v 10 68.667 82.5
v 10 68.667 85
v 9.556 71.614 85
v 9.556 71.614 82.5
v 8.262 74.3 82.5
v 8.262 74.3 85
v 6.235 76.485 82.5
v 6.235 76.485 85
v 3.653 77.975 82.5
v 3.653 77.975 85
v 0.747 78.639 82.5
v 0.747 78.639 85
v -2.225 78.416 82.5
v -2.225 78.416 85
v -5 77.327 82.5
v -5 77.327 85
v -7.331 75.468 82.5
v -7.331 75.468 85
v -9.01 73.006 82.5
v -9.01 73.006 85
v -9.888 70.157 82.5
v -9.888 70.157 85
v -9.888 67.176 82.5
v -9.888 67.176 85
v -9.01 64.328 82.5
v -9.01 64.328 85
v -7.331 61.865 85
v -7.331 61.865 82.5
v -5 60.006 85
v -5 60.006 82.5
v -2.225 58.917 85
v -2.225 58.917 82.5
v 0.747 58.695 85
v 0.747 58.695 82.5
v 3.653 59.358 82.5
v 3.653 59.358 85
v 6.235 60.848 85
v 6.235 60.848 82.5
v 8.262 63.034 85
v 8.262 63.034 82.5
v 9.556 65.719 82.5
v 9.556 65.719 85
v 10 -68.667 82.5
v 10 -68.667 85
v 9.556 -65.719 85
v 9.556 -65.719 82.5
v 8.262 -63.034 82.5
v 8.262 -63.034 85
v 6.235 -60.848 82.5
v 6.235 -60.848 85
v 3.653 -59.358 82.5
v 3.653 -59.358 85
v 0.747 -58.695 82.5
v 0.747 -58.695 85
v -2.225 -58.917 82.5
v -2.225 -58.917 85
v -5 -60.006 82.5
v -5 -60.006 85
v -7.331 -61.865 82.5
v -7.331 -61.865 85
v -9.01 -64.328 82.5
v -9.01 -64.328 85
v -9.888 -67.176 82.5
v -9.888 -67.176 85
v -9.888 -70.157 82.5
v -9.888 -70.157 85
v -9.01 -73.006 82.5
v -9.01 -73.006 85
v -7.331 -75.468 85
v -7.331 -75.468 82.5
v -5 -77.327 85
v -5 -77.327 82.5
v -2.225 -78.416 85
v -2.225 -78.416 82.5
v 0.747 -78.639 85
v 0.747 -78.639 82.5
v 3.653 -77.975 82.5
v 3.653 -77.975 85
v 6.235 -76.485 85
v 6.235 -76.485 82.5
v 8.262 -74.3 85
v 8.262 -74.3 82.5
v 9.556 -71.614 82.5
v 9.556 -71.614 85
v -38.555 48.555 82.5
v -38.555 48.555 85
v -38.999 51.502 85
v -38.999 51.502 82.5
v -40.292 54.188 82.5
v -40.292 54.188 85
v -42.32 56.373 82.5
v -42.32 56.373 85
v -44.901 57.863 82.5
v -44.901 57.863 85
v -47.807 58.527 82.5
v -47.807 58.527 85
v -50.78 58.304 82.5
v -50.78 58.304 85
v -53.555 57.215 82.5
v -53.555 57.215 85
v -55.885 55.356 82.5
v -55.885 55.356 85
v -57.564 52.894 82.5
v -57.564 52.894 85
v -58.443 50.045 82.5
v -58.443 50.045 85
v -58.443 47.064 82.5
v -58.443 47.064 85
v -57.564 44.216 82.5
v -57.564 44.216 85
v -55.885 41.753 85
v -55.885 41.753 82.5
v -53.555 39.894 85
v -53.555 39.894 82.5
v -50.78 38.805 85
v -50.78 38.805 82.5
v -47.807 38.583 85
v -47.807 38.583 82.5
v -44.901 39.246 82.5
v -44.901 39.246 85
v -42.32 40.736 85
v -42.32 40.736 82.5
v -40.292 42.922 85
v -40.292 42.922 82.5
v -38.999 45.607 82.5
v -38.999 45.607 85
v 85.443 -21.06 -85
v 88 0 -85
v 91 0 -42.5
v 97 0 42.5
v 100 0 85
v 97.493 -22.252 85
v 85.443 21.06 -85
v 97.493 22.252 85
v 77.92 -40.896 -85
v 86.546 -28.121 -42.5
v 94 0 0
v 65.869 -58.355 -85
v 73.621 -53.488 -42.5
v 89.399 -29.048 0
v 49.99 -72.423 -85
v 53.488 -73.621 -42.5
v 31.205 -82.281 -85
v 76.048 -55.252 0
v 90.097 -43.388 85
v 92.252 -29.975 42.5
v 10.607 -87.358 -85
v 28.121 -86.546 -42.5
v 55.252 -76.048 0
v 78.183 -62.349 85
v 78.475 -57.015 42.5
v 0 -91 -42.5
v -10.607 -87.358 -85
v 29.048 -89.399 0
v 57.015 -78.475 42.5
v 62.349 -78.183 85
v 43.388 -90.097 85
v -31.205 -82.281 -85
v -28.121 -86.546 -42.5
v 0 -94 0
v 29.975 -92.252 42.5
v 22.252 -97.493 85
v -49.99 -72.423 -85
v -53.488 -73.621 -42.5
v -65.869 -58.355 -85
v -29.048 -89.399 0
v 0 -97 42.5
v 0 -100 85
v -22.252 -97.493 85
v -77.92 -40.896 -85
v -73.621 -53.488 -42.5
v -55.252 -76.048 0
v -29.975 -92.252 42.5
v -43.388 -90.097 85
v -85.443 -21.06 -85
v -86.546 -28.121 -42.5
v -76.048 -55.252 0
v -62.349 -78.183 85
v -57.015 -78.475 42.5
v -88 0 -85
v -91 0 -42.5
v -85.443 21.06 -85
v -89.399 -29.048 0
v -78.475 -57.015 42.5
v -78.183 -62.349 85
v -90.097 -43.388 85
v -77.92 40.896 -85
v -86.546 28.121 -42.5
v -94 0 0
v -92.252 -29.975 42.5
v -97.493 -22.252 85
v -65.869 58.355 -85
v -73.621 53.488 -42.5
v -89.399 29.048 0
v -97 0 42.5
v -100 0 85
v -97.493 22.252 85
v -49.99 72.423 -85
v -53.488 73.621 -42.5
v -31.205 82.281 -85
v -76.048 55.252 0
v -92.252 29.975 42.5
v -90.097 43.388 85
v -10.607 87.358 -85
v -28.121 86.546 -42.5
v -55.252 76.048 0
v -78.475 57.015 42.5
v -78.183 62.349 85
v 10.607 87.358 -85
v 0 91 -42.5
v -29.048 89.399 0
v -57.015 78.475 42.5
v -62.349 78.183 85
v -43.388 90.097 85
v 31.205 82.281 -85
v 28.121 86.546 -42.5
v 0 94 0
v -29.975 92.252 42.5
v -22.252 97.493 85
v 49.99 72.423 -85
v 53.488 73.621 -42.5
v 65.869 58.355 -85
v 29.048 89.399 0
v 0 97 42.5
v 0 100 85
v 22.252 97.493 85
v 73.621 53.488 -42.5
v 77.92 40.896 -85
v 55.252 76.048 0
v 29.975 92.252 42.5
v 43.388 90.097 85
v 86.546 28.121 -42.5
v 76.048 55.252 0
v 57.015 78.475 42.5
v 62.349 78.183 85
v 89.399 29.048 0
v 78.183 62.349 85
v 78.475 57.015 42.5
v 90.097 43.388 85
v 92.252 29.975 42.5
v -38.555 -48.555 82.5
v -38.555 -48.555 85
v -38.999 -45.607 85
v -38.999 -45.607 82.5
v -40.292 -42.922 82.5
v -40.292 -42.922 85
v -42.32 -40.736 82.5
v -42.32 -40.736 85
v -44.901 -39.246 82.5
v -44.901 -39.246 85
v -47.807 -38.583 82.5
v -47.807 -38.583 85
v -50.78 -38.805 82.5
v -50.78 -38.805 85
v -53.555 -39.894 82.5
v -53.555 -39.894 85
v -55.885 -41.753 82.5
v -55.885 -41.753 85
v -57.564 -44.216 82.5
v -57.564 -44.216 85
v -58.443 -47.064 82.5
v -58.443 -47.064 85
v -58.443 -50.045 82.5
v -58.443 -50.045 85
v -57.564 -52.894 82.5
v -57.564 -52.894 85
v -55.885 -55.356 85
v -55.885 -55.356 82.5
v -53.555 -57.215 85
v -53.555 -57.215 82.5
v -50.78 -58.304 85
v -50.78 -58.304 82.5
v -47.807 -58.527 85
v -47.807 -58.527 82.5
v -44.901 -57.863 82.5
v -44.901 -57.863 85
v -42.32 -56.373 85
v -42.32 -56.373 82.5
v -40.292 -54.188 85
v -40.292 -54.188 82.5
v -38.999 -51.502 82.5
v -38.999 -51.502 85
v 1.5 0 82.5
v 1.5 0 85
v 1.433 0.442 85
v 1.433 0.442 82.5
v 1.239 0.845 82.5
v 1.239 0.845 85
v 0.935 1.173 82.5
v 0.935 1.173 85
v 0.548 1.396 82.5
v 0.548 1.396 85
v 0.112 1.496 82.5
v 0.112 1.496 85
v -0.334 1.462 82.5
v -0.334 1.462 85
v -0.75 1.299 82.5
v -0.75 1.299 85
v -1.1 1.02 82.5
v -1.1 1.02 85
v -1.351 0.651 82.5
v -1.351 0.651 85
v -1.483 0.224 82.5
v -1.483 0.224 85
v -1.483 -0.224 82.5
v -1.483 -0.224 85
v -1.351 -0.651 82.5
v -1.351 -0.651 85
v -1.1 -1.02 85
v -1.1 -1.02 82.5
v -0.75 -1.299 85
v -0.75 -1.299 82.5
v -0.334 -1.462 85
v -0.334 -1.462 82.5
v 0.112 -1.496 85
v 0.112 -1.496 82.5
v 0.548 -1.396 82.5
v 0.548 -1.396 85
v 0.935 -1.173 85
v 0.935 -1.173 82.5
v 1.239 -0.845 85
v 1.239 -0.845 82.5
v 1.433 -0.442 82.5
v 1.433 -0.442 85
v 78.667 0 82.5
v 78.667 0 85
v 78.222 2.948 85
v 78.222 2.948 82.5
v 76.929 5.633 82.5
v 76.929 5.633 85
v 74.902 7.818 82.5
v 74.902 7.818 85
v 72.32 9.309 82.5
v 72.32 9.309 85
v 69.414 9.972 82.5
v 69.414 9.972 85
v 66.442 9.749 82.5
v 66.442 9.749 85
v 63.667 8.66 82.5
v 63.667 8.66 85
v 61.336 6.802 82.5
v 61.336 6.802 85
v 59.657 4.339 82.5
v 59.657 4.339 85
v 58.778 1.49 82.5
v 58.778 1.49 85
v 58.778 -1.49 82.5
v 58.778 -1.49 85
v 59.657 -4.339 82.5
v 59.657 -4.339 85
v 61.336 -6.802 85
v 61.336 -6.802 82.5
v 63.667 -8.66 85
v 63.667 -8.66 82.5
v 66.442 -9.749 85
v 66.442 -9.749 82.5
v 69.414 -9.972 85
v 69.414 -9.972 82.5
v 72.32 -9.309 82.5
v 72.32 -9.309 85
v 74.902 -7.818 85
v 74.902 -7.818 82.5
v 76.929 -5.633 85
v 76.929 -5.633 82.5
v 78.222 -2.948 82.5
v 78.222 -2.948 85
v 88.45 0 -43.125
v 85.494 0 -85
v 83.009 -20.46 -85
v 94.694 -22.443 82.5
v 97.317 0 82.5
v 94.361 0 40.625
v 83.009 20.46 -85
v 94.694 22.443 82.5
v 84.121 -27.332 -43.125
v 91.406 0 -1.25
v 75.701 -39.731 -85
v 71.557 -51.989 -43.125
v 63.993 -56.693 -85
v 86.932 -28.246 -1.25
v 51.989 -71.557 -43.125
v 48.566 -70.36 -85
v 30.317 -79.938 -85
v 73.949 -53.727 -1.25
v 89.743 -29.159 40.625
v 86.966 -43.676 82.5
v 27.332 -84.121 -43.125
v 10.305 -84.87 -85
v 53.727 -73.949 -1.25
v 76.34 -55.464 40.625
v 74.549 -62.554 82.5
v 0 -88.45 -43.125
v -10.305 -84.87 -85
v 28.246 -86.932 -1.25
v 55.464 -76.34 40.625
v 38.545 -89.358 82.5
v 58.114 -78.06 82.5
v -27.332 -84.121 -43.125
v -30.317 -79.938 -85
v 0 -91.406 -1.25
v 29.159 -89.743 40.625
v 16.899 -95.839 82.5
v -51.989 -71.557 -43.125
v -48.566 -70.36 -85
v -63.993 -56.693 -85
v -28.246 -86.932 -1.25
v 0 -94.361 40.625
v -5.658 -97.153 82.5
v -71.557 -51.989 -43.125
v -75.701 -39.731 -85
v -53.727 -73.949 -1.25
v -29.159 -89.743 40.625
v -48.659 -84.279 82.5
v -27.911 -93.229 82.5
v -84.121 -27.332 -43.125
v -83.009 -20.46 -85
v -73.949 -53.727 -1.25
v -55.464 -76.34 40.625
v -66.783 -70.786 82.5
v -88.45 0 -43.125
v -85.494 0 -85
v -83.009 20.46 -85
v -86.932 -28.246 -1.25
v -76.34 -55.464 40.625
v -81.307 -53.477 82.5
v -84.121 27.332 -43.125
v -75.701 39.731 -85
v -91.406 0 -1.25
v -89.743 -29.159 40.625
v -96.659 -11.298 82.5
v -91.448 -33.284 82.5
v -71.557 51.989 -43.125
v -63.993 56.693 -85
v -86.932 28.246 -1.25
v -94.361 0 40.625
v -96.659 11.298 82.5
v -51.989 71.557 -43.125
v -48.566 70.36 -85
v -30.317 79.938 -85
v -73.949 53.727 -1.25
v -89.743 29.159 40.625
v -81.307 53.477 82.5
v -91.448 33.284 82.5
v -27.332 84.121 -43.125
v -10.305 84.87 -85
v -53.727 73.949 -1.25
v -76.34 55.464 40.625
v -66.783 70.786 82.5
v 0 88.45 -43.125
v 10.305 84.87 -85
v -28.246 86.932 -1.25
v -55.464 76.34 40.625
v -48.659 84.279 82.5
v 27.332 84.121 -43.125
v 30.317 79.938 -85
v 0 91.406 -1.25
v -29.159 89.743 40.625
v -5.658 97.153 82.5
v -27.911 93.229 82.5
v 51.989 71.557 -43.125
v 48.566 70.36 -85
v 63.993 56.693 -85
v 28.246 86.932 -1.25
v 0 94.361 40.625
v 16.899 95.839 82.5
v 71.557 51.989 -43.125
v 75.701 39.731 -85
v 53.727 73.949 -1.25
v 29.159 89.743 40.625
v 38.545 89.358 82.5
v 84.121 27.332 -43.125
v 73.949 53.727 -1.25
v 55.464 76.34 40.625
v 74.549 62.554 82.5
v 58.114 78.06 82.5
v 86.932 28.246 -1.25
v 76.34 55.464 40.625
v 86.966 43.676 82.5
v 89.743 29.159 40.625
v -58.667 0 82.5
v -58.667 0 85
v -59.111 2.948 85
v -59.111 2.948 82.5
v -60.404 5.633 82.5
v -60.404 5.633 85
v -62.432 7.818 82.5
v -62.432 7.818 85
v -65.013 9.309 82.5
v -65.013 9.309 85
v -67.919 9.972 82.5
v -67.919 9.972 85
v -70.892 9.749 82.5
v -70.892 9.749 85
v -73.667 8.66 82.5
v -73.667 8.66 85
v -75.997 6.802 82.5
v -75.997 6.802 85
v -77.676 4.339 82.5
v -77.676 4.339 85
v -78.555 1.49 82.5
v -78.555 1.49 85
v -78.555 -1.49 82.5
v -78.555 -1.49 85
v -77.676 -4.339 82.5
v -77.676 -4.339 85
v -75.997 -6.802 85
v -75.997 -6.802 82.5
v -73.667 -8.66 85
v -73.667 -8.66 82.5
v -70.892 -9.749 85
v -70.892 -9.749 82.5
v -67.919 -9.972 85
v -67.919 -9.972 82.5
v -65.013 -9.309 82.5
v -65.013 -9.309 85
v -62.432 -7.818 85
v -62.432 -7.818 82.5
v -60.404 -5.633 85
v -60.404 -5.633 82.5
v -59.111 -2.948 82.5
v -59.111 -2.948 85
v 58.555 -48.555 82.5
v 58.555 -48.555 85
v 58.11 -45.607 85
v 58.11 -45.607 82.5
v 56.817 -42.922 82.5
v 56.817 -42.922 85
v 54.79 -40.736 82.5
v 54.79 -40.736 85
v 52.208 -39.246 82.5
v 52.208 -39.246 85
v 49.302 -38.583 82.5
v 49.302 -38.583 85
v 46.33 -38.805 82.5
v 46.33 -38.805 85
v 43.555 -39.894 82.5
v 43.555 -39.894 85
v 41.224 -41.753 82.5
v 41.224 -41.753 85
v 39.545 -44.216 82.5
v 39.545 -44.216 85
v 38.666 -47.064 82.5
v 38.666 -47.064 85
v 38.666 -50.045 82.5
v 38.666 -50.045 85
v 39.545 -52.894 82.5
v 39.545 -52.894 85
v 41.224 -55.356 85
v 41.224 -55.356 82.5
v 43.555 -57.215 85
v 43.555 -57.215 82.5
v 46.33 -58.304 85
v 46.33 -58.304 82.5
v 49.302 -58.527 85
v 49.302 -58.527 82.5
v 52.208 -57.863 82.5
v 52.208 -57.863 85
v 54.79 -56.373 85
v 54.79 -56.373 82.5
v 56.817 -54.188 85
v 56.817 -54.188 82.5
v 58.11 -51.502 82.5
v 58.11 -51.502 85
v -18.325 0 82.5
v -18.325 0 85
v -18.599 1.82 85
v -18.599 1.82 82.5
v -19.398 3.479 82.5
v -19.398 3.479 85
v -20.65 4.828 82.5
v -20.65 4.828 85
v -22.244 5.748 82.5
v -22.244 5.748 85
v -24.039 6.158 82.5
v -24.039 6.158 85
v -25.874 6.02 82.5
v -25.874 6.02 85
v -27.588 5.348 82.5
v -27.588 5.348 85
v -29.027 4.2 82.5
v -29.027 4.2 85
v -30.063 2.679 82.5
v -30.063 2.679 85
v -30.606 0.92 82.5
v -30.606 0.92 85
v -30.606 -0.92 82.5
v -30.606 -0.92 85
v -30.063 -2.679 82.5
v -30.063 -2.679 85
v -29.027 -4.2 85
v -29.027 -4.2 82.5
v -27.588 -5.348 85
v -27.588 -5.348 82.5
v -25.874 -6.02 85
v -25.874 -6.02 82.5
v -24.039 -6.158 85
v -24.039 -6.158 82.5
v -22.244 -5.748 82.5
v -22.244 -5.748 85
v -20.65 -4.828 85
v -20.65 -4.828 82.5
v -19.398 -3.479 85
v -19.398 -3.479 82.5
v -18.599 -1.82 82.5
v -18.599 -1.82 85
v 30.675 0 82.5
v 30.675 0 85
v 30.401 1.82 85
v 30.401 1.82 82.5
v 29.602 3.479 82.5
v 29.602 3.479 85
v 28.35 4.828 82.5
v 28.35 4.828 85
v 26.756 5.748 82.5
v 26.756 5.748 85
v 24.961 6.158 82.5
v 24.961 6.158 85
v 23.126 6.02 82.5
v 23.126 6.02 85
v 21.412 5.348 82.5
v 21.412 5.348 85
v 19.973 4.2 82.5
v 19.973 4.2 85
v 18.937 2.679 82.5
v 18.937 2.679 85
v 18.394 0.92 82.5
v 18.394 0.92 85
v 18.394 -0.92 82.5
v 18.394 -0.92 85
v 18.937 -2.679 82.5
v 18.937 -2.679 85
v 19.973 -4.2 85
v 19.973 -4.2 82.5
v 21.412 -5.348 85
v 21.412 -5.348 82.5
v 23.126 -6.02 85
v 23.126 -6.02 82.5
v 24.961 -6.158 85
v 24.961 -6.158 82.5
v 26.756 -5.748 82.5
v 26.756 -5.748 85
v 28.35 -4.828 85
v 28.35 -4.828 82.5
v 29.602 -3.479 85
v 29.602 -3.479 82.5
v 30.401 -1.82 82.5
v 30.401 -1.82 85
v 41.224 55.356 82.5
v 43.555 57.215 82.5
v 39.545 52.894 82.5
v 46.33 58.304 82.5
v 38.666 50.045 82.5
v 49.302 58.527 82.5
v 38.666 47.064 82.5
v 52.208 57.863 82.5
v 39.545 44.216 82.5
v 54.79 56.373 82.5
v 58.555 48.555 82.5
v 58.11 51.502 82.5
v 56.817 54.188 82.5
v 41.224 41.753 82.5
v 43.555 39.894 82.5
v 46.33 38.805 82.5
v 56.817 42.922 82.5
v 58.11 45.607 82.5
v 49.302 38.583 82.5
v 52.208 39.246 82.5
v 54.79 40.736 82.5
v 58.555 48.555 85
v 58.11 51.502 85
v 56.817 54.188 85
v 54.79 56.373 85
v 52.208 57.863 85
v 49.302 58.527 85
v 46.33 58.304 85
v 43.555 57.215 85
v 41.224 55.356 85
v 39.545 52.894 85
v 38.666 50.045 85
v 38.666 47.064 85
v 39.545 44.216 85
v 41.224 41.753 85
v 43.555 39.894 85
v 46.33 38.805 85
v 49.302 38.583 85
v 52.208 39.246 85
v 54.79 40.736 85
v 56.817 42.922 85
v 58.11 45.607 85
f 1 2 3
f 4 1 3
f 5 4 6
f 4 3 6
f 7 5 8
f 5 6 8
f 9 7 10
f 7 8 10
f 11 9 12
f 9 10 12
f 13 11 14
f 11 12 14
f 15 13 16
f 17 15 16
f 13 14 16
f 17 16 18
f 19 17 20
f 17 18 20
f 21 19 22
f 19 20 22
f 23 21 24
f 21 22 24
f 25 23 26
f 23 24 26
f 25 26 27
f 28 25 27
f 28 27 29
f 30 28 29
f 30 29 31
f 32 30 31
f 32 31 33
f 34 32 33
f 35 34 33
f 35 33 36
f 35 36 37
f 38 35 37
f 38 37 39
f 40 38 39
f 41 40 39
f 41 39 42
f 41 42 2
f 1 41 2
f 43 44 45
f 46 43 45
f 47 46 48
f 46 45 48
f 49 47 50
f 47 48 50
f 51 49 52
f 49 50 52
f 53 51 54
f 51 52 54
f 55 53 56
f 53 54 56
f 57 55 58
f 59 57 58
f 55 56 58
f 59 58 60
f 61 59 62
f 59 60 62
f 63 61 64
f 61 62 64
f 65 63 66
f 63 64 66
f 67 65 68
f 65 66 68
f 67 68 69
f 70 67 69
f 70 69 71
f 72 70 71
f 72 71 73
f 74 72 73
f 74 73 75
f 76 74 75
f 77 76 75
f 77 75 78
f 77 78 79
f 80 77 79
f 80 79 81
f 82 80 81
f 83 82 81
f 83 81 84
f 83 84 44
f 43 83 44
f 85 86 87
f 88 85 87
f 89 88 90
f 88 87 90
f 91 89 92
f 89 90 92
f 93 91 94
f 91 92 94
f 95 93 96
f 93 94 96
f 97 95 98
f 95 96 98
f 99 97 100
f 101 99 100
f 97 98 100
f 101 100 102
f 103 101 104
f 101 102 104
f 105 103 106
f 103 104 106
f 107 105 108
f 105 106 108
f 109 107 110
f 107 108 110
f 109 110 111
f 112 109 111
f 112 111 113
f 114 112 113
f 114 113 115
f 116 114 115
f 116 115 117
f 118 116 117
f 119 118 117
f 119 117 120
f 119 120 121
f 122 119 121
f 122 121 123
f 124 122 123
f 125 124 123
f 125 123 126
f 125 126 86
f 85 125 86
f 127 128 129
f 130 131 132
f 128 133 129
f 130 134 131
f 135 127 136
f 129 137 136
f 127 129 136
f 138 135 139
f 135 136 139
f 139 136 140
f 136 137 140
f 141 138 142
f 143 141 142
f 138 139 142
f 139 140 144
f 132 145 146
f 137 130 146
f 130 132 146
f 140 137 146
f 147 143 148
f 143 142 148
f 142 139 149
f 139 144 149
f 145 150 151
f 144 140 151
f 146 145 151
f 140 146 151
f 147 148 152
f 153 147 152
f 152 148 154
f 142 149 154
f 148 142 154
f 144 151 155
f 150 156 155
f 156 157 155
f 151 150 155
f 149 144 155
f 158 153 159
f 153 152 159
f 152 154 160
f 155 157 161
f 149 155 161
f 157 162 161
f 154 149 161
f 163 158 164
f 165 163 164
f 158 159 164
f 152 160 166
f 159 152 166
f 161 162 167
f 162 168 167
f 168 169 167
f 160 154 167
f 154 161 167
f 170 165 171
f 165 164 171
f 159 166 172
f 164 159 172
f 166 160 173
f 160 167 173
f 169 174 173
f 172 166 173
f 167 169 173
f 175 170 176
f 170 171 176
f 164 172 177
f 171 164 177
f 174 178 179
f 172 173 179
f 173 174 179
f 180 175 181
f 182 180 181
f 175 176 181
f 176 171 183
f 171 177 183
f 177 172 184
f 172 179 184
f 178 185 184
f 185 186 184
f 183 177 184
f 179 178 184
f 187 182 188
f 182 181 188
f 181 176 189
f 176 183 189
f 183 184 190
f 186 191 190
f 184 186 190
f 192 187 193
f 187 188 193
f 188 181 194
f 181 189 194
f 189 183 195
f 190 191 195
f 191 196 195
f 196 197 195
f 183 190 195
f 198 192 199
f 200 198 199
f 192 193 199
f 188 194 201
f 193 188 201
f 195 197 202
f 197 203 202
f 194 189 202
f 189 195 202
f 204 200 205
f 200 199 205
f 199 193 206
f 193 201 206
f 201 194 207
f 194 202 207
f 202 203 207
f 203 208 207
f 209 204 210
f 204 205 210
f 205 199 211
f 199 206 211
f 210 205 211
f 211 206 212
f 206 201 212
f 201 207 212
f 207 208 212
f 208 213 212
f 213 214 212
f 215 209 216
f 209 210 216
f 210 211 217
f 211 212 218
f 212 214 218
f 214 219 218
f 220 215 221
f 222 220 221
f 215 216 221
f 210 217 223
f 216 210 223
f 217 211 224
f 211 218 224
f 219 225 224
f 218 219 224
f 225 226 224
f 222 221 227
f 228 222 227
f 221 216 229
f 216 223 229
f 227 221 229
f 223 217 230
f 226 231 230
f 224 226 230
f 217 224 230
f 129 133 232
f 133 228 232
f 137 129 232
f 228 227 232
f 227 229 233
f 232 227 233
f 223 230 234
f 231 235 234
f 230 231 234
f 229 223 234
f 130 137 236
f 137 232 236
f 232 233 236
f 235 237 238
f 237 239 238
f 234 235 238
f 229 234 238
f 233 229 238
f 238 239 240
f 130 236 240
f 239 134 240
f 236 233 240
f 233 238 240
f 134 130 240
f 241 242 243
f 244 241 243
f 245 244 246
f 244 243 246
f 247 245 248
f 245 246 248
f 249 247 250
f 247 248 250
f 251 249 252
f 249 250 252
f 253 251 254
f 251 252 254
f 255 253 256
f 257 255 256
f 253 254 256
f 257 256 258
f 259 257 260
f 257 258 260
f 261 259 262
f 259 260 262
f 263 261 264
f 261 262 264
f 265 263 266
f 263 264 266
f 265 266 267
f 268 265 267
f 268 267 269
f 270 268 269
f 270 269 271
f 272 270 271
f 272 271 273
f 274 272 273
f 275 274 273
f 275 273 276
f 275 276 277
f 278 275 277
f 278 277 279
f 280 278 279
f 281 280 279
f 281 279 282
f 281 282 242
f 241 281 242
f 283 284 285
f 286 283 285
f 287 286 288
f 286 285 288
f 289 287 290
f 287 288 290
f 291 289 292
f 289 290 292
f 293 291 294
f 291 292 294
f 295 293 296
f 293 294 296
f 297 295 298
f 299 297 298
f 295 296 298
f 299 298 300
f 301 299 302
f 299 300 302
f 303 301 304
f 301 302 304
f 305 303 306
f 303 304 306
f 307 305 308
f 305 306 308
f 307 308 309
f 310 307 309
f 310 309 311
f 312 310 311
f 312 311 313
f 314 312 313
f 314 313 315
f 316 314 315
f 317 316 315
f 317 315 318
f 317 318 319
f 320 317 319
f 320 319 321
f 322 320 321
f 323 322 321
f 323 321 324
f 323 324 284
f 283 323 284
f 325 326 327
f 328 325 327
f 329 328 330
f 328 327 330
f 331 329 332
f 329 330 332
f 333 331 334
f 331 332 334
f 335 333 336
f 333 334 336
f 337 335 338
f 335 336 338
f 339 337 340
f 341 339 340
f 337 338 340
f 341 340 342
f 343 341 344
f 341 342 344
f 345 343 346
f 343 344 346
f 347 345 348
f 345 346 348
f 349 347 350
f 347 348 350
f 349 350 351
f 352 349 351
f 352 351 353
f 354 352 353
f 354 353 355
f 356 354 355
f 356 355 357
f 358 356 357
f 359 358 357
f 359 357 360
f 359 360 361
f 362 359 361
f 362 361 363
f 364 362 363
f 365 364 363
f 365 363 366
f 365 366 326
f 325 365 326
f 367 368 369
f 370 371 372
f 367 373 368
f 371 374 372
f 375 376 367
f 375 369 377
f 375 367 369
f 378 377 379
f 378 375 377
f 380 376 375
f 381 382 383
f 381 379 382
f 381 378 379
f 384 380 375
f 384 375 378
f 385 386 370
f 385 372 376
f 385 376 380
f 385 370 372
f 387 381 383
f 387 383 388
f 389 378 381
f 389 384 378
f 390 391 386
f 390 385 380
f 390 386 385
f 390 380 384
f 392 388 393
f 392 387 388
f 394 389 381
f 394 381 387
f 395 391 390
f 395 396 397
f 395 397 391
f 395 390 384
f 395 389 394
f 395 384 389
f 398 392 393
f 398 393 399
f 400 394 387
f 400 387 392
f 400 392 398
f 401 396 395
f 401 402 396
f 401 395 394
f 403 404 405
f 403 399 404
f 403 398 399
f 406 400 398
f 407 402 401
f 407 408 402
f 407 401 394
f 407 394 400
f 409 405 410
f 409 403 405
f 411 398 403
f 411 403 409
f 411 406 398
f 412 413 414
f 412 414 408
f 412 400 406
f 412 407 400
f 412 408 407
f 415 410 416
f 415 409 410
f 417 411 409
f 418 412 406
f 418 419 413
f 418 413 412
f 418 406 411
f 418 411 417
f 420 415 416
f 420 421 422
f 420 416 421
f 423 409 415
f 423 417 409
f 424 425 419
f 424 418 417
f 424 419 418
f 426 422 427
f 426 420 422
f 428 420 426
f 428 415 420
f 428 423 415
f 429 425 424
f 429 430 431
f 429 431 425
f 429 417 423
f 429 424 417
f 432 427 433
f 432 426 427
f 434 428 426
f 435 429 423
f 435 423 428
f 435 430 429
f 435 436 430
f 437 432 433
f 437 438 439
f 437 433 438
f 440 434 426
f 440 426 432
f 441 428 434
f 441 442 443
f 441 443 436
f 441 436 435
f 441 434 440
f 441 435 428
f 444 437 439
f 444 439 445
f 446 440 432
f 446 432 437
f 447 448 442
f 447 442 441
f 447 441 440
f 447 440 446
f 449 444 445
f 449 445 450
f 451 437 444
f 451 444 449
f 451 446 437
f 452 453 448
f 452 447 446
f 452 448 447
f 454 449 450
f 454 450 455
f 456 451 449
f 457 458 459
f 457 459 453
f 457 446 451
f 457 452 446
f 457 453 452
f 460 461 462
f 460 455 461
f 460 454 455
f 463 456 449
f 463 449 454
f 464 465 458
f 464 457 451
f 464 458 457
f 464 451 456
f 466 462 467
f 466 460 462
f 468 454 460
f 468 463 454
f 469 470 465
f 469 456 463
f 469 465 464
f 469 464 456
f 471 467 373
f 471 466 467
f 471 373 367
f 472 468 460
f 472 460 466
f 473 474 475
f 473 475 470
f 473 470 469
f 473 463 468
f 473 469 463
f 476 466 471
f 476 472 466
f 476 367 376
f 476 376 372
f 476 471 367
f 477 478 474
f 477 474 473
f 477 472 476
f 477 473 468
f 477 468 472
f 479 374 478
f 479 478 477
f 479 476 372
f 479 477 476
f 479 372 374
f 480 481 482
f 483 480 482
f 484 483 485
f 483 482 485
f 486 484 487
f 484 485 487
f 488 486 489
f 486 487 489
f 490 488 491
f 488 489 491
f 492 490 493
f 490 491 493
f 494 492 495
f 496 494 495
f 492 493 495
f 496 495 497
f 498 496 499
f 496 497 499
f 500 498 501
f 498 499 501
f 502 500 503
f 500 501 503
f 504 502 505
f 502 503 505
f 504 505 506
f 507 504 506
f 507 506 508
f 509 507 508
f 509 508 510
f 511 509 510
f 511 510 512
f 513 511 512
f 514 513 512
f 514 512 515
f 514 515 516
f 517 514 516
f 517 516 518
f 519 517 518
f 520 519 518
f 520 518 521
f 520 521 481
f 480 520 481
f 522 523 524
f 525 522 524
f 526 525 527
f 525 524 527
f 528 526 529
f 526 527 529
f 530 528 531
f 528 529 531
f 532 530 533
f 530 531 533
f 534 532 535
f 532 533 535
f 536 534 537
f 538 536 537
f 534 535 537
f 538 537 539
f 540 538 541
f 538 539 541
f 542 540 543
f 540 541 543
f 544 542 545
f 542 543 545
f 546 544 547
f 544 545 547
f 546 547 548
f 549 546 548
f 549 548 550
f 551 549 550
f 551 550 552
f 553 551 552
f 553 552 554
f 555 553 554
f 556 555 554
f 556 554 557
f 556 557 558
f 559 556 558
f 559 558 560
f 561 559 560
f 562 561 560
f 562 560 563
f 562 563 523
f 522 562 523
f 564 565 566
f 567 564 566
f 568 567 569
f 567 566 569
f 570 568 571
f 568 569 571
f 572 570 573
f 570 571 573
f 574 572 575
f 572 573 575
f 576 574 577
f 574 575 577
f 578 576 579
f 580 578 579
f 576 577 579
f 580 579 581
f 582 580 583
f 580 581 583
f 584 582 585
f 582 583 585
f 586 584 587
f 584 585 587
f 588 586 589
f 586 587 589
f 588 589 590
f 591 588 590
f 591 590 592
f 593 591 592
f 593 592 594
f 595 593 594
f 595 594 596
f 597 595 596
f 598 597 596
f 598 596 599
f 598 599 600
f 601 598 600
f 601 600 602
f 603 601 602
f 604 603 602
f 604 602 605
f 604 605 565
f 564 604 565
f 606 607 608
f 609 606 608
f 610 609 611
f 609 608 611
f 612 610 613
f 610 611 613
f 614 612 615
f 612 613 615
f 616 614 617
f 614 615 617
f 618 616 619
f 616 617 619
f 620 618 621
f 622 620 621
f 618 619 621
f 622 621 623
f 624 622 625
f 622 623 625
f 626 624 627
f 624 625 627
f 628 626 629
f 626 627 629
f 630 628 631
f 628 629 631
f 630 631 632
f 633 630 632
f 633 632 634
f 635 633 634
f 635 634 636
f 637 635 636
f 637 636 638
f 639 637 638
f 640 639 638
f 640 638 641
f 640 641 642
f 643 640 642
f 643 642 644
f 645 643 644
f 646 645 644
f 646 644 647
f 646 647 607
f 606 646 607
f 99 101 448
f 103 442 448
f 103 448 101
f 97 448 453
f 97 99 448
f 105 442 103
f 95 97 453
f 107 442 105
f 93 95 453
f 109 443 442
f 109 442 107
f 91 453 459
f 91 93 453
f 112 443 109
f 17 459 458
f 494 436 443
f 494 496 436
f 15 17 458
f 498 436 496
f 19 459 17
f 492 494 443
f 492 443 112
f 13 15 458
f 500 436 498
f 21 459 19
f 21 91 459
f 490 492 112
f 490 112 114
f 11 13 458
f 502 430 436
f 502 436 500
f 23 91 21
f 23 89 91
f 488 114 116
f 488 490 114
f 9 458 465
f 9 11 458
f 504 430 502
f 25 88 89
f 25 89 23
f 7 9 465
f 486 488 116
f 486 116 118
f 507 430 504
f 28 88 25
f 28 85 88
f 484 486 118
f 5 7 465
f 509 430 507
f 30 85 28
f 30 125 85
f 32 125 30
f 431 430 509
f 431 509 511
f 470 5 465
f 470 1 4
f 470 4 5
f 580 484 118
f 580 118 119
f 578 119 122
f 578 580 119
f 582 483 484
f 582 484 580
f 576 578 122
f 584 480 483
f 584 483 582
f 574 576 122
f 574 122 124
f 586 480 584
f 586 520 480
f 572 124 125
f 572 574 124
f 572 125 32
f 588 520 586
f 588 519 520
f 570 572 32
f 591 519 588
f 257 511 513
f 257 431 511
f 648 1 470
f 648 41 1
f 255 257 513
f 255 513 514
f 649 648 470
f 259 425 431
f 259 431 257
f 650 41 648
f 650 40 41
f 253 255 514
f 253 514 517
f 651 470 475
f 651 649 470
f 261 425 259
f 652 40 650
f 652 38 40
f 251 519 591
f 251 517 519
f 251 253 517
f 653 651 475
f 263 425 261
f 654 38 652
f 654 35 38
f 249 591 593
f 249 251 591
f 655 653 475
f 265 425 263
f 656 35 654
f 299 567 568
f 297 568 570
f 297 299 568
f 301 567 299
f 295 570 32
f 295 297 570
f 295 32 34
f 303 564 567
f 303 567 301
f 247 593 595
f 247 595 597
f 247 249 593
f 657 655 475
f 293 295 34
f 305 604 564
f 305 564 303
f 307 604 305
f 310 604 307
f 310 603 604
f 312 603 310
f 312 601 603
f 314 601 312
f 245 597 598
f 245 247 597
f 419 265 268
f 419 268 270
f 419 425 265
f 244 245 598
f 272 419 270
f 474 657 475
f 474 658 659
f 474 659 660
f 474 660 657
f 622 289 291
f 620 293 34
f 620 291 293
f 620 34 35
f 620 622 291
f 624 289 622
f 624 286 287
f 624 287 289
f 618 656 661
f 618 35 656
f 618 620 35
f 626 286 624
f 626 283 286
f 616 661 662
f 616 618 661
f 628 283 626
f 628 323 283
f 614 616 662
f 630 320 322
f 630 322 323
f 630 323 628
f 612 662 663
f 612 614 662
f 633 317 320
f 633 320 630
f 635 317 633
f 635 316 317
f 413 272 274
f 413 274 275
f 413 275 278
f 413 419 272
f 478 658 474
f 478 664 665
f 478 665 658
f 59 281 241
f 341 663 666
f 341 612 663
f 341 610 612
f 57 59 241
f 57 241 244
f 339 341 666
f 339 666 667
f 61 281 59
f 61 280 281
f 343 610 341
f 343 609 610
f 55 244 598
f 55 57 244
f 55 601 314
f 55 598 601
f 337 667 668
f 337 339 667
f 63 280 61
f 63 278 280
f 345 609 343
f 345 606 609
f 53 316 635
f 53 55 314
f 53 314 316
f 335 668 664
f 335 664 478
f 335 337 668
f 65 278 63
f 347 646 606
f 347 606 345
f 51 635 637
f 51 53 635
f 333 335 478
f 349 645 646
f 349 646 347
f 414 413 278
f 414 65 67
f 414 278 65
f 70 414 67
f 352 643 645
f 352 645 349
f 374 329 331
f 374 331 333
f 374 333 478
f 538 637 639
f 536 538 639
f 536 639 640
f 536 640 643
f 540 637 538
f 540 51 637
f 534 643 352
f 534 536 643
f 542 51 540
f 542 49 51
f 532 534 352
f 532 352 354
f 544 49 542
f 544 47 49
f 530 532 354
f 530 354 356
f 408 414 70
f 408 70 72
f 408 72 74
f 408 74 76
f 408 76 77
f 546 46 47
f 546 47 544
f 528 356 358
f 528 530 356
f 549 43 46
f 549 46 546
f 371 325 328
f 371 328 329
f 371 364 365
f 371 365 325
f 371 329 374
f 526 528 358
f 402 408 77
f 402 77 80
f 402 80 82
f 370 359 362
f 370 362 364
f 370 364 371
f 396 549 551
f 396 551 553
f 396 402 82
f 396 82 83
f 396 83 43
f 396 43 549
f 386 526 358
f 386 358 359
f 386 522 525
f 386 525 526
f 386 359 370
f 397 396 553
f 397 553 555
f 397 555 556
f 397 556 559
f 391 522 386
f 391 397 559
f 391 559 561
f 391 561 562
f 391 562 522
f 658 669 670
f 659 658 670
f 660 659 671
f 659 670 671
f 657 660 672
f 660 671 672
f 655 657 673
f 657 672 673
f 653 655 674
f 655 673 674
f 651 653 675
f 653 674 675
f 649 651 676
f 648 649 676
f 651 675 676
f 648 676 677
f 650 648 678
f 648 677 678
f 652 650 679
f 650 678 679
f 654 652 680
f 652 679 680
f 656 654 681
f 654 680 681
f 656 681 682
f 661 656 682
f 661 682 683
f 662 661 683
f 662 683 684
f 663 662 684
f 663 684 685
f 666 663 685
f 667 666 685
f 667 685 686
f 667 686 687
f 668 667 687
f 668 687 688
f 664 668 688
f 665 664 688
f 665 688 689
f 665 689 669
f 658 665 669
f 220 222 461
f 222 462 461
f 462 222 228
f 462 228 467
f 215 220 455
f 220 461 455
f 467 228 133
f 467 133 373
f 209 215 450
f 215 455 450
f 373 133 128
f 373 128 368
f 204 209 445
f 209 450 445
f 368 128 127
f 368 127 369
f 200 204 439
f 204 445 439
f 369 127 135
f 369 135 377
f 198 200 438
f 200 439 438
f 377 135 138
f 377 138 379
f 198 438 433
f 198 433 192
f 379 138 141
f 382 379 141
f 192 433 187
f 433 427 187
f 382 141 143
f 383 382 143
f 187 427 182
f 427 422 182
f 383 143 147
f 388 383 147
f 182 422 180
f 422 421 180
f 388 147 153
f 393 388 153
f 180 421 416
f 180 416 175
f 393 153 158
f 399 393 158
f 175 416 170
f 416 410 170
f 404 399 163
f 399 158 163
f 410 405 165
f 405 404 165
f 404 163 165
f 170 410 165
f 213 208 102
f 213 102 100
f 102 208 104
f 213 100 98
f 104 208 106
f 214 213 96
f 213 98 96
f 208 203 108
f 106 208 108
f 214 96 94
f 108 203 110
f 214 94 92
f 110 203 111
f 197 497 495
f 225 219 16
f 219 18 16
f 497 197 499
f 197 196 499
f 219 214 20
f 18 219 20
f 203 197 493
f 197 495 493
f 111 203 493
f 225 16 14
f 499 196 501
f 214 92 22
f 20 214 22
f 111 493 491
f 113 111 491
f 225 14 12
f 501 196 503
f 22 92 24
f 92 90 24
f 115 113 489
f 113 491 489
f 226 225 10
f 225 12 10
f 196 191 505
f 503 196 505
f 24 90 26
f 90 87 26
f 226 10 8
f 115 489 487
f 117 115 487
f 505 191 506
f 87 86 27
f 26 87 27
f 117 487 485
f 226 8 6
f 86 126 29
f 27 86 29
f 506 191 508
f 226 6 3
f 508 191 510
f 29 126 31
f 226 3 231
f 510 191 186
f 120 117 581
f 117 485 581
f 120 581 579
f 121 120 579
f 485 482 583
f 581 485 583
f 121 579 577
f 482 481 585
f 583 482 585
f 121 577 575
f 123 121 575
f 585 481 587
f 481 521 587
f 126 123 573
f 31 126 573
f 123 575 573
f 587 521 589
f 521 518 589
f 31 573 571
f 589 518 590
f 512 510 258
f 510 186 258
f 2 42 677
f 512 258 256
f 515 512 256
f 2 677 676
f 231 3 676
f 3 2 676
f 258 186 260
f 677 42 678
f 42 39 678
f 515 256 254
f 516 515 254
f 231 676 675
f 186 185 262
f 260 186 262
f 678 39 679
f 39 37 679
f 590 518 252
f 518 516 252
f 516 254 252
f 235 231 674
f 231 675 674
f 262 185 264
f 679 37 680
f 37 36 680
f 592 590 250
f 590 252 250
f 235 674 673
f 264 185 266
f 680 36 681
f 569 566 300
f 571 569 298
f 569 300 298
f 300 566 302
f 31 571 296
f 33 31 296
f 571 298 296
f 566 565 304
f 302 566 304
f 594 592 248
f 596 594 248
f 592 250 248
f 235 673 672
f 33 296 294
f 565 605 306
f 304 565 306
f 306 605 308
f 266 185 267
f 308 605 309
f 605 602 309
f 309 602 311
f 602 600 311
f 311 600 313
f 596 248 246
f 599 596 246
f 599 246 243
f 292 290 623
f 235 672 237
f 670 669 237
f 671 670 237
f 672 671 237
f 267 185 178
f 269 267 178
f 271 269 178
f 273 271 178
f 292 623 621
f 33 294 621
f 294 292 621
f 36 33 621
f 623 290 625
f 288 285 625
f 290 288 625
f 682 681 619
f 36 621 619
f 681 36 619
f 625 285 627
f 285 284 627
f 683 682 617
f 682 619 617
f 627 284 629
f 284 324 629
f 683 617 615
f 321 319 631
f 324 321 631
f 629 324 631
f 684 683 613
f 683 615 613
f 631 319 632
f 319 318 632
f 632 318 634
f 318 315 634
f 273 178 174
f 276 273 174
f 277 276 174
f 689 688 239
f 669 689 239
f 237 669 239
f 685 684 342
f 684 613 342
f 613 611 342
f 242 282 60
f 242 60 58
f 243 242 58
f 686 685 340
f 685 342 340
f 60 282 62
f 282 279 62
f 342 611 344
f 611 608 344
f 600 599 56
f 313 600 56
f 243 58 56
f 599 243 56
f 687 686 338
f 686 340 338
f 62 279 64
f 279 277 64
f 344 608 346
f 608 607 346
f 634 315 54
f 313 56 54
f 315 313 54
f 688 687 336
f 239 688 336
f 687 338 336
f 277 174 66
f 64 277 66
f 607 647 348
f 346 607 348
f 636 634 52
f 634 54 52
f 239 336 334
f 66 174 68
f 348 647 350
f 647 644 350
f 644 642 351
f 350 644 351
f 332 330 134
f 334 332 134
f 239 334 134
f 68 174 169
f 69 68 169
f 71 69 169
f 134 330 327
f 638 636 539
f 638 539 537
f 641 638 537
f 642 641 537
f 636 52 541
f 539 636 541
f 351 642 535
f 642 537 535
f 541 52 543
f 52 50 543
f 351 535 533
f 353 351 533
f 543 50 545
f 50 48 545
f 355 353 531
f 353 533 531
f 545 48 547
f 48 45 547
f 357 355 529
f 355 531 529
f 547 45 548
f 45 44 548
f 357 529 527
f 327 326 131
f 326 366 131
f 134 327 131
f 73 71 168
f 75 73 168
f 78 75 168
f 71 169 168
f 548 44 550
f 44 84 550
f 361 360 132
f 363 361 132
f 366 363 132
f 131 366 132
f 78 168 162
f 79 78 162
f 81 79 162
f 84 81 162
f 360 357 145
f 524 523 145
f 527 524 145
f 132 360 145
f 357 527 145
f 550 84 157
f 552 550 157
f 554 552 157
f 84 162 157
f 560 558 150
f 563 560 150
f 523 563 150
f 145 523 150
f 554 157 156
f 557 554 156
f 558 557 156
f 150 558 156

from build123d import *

# Parameters (mm, degrees)
VACIADO1_T            = -2.5
CORTAR_EXTRUIR5_REACH = 223.133
CROQUIS2_R            = 1.5
CROQUIS2_R_2          = 6.175
CROQUIS9_R            = 10
CORTAR_EXTRUIR9_DEPTH = 10


with BuildPart() as part:
    # Croquis1 → Revolución1 (revolve)
    with BuildSketch(Plane(origin=(0, 0, 0), x_dir=(1, 0, 0), z_dir=(0, 1, 0)), mode=Mode.PRIVATE) as revoluci_n1_sk:
        Polygon((0, -85), (0, 85), (-88, 85), (-100, -85), align=None)
    revolve(revoluci_n1_sk.sketch.rotate(Axis((0, 0, 85), (0, 0, -1)), 180), axis=Axis((0, 0, 85), (0, 0, -1)))

    # Vaciado1
    vaciado1_openings = [part.faces().sort_by_distance(p)[0] for p in [
        (0, 0, -85),
    ]]
    offset(amount=VACIADO1_T, openings=vaciado1_openings, kind=Kind.INTERSECTION)

    # Croquis2 → Cortar-Extruir5 (cut, up to next)
    with BuildSketch(Plane.XY.offset(85), mode=Mode.PRIVATE) as cortar_extruir5_sk1:
        Circle(CROQUIS2_R)
    cortar_extruir5_tool1 = extrude(cortar_extruir5_sk1.sketch, amount=-CORTAR_EXTRUIR5_REACH, mode=Mode.PRIVATE) & part.part
    # Croquis2 → Cortar-Extruir5 (cut, up to next)
    with BuildSketch(Plane.XY.offset(85), mode=Mode.PRIVATE) as cortar_extruir5_sk2:
        with Locations((-24.5, 0)):
            Circle(CROQUIS2_R_2)
    cortar_extruir5_tool2 = extrude(cortar_extruir5_sk2.sketch, amount=-CORTAR_EXTRUIR5_REACH, mode=Mode.PRIVATE) & part.part
    # Croquis2 → Cortar-Extruir5 (cut, up to next)
    with BuildSketch(Plane.XY.offset(85), mode=Mode.PRIVATE) as cortar_extruir5_sk3:
        with Locations((24.5, 0)):
            Circle(CROQUIS2_R_2)
    cortar_extruir5_tool3 = extrude(cortar_extruir5_sk3.sketch, amount=-CORTAR_EXTRUIR5_REACH, mode=Mode.PRIVATE) & part.part
    add(cortar_extruir5_tool1.solids().sort_by_distance((0, 0, 85))[0], mode=Mode.SUBTRACT)
    add(cortar_extruir5_tool2.solids().sort_by_distance((-24.5, 0, 85))[0], mode=Mode.SUBTRACT)
    add(cortar_extruir5_tool3.solids().sort_by_distance((24.5, 0, 85))[0], mode=Mode.SUBTRACT)

    # Croquis9 → Cortar-Extruir9 (cut)
    with BuildSketch(Plane.XY.offset(85)):
        with Locations((0, 68.666733176)):
            Circle(CROQUIS9_R)
        with Locations((48.55471267, 48.55471267)):
            Circle(CROQUIS9_R)
        with Locations((68.666733176, 0)):
            Circle(CROQUIS9_R)
        with Locations((48.55471267, -48.55471267)):
            Circle(CROQUIS9_R)
        with Locations((0, -68.666733176)):
            Circle(CROQUIS9_R)
        with Locations((-48.55471267, -48.55471267)):
            Circle(CROQUIS9_R)
        with Locations((-68.666733176, 0)):
            Circle(CROQUIS9_R)
        with Locations((-48.55471267, 48.55471267)):
            Circle(CROQUIS9_R)
    extrude(amount=-CORTAR_EXTRUIR9_DEPTH, mode=Mode.SUBTRACT)


solid = part.part
